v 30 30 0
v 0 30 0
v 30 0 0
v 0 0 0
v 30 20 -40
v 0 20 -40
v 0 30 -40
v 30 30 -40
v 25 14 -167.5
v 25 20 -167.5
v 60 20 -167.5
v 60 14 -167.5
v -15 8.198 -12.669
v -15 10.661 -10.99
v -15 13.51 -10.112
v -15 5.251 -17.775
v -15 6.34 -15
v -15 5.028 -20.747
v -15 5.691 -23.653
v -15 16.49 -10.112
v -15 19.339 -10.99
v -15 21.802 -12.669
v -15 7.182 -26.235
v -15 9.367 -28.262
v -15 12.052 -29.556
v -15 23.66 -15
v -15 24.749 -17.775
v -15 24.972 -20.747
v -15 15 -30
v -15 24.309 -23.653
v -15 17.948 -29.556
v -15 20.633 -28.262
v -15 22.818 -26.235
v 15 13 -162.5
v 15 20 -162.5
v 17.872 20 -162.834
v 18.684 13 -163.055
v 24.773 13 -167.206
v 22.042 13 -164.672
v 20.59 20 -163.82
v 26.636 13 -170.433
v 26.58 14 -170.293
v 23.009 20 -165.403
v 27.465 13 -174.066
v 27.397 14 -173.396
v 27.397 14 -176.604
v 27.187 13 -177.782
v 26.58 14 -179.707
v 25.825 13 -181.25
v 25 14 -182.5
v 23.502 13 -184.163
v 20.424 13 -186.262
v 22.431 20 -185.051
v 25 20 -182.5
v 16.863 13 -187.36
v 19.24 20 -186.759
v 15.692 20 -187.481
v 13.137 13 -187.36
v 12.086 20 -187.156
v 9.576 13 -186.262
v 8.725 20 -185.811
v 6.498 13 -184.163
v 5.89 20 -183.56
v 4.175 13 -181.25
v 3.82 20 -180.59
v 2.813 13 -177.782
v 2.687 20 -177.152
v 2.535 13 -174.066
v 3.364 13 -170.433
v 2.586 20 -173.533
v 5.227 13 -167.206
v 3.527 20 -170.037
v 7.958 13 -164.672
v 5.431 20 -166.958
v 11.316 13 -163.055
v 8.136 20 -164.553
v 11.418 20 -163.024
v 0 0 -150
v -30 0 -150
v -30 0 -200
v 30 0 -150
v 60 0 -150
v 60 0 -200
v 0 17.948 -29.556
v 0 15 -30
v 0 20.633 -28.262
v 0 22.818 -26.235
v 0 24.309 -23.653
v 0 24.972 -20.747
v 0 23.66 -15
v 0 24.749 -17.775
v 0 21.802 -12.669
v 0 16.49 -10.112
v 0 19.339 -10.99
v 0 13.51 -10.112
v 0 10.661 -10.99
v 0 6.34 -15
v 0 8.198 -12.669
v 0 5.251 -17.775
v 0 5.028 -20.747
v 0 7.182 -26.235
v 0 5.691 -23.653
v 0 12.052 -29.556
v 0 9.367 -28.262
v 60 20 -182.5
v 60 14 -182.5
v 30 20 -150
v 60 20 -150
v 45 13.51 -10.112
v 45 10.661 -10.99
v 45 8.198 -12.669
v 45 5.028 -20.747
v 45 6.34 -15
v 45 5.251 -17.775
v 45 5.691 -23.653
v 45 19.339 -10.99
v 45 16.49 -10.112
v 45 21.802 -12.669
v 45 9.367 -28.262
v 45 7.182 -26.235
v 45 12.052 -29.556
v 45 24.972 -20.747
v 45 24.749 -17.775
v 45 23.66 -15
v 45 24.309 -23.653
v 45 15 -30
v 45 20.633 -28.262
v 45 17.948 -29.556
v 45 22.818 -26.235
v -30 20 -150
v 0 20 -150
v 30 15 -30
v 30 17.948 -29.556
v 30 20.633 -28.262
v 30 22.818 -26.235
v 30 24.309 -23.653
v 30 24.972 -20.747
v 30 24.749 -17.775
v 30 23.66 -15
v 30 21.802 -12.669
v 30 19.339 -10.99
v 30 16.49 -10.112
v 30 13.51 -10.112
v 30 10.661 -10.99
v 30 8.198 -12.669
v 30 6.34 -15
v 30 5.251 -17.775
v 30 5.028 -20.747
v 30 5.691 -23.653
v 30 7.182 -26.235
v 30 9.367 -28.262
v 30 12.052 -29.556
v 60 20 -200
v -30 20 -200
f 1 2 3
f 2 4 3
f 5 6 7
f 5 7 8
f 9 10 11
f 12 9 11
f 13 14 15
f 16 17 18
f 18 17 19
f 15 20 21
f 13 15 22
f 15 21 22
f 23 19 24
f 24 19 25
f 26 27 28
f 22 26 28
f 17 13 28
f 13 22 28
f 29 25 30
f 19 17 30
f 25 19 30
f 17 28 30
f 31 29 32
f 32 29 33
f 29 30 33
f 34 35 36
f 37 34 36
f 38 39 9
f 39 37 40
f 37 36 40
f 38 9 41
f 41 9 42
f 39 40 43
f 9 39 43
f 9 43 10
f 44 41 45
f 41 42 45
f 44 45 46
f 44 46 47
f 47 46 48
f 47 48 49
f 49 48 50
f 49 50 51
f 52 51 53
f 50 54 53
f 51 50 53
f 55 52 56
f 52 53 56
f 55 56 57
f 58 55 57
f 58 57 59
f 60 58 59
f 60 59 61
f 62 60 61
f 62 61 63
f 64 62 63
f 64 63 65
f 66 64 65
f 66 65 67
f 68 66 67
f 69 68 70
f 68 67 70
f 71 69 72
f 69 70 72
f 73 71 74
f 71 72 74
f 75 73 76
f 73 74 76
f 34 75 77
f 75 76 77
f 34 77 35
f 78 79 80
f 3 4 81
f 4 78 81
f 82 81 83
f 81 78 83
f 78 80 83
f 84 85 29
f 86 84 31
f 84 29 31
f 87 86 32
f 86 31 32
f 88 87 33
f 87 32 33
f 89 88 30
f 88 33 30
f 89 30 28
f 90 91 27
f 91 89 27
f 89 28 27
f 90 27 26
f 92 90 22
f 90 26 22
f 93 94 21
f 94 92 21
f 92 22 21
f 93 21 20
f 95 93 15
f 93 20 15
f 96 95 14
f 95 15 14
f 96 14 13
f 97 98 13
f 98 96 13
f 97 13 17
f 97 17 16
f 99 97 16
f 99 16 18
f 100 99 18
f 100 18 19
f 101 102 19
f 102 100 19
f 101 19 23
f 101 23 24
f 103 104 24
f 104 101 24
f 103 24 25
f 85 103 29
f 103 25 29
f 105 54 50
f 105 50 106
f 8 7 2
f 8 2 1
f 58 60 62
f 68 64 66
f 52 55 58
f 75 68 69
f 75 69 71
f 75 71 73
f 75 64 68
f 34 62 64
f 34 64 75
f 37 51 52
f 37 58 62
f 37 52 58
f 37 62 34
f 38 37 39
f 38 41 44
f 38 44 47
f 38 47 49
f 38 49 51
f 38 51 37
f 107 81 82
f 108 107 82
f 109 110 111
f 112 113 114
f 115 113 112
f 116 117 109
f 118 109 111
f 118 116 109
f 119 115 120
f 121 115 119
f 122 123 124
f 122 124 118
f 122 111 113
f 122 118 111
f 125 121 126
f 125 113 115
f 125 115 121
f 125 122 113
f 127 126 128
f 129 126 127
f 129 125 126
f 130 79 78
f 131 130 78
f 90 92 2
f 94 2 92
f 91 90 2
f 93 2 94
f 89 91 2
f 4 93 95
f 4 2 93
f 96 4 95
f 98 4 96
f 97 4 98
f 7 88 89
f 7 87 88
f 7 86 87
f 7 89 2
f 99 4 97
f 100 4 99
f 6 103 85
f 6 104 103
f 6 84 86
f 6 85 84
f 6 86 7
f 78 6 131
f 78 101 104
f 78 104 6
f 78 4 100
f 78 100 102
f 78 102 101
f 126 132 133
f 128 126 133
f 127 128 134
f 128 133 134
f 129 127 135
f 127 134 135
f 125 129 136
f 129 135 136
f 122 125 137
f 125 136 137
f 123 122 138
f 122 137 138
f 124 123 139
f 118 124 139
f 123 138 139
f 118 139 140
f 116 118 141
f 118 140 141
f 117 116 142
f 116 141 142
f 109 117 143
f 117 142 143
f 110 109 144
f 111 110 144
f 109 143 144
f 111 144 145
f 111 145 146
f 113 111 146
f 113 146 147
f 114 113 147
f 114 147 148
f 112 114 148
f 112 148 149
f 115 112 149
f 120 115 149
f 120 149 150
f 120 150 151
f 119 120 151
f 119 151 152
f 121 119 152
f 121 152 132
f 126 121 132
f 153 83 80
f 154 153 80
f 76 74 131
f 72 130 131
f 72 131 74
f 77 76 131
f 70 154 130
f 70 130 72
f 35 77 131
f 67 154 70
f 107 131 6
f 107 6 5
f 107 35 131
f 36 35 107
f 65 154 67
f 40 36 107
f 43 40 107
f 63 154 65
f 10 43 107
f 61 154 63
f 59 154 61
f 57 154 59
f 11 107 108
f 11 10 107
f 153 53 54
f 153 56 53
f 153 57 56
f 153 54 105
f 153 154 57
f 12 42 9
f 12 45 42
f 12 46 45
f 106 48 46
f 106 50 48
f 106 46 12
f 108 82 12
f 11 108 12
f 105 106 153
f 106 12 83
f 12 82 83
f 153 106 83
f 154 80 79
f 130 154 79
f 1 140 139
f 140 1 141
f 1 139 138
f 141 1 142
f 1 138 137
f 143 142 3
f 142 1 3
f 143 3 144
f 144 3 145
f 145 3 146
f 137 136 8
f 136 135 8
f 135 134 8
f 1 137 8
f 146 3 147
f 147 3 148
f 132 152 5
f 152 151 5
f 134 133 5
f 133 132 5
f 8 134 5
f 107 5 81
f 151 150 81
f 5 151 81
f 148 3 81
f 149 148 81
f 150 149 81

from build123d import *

# Parameters (mm, degrees)
BOSS_EXTRUDE1_DEPTH      = 20
SKETCH2_R                = 12.5
CUT_EXTRUDE1_DEPTH       = 7
SKETCH3_W                = 38
SKETCH3_H                = 15
CUT_EXTRUDE2_DEPTH       = 6
SKETCH7_W                = 30
SKETCH7_H                = 40
BOSS_EXTRUDE2_DEPTH      = 10
BOSS_EXTRUDE3_DEPTH      = 15
BOSS_EXTRUDE3_DEPTH_BACK = 45
SKETCH8_R                = 10


with BuildPart() as part:
    # Sketch1 → Boss-Extrude1 (new body)
    with BuildSketch(Plane(origin=(0, 0, 0), x_dir=(1, 0, 0), z_dir=(0, 1, 0))):
        Polygon((0, 0), (30, 0), (30, 150), (60, 150), (60, 200), (-30, 200), (-30, 150), (0, 150), align=None)
    extrude(amount=BOSS_EXTRUDE1_DEPTH)

    # Sketch2 → Cut-Extrude1 (cut)
    with BuildSketch(Plane(origin=(0, 20, 0), x_dir=(1, 0, 0), z_dir=(0, 1, 0))):
        with Locations(Location((15, 175, 0), (0, 0, 270))):
            Circle(SKETCH2_R)
    extrude(amount=-CUT_EXTRUDE1_DEPTH, mode=Mode.SUBTRACT)

    # Sketch3 → Cut-Extrude2 (cut)
    with BuildSketch(Plane(origin=(0, 20, 0), x_dir=(1, 0, 0), z_dir=(0, 1, 0))):
        with Locations((41, 175)):
            Rectangle(SKETCH3_W, SKETCH3_H)
    extrude(amount=-CUT_EXTRUDE2_DEPTH, mode=Mode.SUBTRACT)

    # Sketch7 → Boss-Extrude2 (add)
    with BuildSketch(Plane(origin=(0, 20, 0), x_dir=(1, 0, 0), z_dir=(0, 1, 0))):
        with Locations((15, 20)):
            Rectangle(SKETCH7_W, SKETCH7_H)
    extrude(amount=BOSS_EXTRUDE2_DEPTH)

    # Sketch8 → Boss-Extrude3 (add, two sides: drawn at the far end of the back side and taken through both)
    with BuildSketch(Plane(origin=(30, 0, 0), x_dir=(0, 0, -1), z_dir=(1, 0, 0)).offset(-BOSS_EXTRUDE3_DEPTH_BACK)):
        with Locations((20, 15)):
            Circle(SKETCH8_R)
    extrude(amount=BOSS_EXTRUDE3_DEPTH + BOSS_EXTRUDE3_DEPTH_BACK)


solid = part.part
